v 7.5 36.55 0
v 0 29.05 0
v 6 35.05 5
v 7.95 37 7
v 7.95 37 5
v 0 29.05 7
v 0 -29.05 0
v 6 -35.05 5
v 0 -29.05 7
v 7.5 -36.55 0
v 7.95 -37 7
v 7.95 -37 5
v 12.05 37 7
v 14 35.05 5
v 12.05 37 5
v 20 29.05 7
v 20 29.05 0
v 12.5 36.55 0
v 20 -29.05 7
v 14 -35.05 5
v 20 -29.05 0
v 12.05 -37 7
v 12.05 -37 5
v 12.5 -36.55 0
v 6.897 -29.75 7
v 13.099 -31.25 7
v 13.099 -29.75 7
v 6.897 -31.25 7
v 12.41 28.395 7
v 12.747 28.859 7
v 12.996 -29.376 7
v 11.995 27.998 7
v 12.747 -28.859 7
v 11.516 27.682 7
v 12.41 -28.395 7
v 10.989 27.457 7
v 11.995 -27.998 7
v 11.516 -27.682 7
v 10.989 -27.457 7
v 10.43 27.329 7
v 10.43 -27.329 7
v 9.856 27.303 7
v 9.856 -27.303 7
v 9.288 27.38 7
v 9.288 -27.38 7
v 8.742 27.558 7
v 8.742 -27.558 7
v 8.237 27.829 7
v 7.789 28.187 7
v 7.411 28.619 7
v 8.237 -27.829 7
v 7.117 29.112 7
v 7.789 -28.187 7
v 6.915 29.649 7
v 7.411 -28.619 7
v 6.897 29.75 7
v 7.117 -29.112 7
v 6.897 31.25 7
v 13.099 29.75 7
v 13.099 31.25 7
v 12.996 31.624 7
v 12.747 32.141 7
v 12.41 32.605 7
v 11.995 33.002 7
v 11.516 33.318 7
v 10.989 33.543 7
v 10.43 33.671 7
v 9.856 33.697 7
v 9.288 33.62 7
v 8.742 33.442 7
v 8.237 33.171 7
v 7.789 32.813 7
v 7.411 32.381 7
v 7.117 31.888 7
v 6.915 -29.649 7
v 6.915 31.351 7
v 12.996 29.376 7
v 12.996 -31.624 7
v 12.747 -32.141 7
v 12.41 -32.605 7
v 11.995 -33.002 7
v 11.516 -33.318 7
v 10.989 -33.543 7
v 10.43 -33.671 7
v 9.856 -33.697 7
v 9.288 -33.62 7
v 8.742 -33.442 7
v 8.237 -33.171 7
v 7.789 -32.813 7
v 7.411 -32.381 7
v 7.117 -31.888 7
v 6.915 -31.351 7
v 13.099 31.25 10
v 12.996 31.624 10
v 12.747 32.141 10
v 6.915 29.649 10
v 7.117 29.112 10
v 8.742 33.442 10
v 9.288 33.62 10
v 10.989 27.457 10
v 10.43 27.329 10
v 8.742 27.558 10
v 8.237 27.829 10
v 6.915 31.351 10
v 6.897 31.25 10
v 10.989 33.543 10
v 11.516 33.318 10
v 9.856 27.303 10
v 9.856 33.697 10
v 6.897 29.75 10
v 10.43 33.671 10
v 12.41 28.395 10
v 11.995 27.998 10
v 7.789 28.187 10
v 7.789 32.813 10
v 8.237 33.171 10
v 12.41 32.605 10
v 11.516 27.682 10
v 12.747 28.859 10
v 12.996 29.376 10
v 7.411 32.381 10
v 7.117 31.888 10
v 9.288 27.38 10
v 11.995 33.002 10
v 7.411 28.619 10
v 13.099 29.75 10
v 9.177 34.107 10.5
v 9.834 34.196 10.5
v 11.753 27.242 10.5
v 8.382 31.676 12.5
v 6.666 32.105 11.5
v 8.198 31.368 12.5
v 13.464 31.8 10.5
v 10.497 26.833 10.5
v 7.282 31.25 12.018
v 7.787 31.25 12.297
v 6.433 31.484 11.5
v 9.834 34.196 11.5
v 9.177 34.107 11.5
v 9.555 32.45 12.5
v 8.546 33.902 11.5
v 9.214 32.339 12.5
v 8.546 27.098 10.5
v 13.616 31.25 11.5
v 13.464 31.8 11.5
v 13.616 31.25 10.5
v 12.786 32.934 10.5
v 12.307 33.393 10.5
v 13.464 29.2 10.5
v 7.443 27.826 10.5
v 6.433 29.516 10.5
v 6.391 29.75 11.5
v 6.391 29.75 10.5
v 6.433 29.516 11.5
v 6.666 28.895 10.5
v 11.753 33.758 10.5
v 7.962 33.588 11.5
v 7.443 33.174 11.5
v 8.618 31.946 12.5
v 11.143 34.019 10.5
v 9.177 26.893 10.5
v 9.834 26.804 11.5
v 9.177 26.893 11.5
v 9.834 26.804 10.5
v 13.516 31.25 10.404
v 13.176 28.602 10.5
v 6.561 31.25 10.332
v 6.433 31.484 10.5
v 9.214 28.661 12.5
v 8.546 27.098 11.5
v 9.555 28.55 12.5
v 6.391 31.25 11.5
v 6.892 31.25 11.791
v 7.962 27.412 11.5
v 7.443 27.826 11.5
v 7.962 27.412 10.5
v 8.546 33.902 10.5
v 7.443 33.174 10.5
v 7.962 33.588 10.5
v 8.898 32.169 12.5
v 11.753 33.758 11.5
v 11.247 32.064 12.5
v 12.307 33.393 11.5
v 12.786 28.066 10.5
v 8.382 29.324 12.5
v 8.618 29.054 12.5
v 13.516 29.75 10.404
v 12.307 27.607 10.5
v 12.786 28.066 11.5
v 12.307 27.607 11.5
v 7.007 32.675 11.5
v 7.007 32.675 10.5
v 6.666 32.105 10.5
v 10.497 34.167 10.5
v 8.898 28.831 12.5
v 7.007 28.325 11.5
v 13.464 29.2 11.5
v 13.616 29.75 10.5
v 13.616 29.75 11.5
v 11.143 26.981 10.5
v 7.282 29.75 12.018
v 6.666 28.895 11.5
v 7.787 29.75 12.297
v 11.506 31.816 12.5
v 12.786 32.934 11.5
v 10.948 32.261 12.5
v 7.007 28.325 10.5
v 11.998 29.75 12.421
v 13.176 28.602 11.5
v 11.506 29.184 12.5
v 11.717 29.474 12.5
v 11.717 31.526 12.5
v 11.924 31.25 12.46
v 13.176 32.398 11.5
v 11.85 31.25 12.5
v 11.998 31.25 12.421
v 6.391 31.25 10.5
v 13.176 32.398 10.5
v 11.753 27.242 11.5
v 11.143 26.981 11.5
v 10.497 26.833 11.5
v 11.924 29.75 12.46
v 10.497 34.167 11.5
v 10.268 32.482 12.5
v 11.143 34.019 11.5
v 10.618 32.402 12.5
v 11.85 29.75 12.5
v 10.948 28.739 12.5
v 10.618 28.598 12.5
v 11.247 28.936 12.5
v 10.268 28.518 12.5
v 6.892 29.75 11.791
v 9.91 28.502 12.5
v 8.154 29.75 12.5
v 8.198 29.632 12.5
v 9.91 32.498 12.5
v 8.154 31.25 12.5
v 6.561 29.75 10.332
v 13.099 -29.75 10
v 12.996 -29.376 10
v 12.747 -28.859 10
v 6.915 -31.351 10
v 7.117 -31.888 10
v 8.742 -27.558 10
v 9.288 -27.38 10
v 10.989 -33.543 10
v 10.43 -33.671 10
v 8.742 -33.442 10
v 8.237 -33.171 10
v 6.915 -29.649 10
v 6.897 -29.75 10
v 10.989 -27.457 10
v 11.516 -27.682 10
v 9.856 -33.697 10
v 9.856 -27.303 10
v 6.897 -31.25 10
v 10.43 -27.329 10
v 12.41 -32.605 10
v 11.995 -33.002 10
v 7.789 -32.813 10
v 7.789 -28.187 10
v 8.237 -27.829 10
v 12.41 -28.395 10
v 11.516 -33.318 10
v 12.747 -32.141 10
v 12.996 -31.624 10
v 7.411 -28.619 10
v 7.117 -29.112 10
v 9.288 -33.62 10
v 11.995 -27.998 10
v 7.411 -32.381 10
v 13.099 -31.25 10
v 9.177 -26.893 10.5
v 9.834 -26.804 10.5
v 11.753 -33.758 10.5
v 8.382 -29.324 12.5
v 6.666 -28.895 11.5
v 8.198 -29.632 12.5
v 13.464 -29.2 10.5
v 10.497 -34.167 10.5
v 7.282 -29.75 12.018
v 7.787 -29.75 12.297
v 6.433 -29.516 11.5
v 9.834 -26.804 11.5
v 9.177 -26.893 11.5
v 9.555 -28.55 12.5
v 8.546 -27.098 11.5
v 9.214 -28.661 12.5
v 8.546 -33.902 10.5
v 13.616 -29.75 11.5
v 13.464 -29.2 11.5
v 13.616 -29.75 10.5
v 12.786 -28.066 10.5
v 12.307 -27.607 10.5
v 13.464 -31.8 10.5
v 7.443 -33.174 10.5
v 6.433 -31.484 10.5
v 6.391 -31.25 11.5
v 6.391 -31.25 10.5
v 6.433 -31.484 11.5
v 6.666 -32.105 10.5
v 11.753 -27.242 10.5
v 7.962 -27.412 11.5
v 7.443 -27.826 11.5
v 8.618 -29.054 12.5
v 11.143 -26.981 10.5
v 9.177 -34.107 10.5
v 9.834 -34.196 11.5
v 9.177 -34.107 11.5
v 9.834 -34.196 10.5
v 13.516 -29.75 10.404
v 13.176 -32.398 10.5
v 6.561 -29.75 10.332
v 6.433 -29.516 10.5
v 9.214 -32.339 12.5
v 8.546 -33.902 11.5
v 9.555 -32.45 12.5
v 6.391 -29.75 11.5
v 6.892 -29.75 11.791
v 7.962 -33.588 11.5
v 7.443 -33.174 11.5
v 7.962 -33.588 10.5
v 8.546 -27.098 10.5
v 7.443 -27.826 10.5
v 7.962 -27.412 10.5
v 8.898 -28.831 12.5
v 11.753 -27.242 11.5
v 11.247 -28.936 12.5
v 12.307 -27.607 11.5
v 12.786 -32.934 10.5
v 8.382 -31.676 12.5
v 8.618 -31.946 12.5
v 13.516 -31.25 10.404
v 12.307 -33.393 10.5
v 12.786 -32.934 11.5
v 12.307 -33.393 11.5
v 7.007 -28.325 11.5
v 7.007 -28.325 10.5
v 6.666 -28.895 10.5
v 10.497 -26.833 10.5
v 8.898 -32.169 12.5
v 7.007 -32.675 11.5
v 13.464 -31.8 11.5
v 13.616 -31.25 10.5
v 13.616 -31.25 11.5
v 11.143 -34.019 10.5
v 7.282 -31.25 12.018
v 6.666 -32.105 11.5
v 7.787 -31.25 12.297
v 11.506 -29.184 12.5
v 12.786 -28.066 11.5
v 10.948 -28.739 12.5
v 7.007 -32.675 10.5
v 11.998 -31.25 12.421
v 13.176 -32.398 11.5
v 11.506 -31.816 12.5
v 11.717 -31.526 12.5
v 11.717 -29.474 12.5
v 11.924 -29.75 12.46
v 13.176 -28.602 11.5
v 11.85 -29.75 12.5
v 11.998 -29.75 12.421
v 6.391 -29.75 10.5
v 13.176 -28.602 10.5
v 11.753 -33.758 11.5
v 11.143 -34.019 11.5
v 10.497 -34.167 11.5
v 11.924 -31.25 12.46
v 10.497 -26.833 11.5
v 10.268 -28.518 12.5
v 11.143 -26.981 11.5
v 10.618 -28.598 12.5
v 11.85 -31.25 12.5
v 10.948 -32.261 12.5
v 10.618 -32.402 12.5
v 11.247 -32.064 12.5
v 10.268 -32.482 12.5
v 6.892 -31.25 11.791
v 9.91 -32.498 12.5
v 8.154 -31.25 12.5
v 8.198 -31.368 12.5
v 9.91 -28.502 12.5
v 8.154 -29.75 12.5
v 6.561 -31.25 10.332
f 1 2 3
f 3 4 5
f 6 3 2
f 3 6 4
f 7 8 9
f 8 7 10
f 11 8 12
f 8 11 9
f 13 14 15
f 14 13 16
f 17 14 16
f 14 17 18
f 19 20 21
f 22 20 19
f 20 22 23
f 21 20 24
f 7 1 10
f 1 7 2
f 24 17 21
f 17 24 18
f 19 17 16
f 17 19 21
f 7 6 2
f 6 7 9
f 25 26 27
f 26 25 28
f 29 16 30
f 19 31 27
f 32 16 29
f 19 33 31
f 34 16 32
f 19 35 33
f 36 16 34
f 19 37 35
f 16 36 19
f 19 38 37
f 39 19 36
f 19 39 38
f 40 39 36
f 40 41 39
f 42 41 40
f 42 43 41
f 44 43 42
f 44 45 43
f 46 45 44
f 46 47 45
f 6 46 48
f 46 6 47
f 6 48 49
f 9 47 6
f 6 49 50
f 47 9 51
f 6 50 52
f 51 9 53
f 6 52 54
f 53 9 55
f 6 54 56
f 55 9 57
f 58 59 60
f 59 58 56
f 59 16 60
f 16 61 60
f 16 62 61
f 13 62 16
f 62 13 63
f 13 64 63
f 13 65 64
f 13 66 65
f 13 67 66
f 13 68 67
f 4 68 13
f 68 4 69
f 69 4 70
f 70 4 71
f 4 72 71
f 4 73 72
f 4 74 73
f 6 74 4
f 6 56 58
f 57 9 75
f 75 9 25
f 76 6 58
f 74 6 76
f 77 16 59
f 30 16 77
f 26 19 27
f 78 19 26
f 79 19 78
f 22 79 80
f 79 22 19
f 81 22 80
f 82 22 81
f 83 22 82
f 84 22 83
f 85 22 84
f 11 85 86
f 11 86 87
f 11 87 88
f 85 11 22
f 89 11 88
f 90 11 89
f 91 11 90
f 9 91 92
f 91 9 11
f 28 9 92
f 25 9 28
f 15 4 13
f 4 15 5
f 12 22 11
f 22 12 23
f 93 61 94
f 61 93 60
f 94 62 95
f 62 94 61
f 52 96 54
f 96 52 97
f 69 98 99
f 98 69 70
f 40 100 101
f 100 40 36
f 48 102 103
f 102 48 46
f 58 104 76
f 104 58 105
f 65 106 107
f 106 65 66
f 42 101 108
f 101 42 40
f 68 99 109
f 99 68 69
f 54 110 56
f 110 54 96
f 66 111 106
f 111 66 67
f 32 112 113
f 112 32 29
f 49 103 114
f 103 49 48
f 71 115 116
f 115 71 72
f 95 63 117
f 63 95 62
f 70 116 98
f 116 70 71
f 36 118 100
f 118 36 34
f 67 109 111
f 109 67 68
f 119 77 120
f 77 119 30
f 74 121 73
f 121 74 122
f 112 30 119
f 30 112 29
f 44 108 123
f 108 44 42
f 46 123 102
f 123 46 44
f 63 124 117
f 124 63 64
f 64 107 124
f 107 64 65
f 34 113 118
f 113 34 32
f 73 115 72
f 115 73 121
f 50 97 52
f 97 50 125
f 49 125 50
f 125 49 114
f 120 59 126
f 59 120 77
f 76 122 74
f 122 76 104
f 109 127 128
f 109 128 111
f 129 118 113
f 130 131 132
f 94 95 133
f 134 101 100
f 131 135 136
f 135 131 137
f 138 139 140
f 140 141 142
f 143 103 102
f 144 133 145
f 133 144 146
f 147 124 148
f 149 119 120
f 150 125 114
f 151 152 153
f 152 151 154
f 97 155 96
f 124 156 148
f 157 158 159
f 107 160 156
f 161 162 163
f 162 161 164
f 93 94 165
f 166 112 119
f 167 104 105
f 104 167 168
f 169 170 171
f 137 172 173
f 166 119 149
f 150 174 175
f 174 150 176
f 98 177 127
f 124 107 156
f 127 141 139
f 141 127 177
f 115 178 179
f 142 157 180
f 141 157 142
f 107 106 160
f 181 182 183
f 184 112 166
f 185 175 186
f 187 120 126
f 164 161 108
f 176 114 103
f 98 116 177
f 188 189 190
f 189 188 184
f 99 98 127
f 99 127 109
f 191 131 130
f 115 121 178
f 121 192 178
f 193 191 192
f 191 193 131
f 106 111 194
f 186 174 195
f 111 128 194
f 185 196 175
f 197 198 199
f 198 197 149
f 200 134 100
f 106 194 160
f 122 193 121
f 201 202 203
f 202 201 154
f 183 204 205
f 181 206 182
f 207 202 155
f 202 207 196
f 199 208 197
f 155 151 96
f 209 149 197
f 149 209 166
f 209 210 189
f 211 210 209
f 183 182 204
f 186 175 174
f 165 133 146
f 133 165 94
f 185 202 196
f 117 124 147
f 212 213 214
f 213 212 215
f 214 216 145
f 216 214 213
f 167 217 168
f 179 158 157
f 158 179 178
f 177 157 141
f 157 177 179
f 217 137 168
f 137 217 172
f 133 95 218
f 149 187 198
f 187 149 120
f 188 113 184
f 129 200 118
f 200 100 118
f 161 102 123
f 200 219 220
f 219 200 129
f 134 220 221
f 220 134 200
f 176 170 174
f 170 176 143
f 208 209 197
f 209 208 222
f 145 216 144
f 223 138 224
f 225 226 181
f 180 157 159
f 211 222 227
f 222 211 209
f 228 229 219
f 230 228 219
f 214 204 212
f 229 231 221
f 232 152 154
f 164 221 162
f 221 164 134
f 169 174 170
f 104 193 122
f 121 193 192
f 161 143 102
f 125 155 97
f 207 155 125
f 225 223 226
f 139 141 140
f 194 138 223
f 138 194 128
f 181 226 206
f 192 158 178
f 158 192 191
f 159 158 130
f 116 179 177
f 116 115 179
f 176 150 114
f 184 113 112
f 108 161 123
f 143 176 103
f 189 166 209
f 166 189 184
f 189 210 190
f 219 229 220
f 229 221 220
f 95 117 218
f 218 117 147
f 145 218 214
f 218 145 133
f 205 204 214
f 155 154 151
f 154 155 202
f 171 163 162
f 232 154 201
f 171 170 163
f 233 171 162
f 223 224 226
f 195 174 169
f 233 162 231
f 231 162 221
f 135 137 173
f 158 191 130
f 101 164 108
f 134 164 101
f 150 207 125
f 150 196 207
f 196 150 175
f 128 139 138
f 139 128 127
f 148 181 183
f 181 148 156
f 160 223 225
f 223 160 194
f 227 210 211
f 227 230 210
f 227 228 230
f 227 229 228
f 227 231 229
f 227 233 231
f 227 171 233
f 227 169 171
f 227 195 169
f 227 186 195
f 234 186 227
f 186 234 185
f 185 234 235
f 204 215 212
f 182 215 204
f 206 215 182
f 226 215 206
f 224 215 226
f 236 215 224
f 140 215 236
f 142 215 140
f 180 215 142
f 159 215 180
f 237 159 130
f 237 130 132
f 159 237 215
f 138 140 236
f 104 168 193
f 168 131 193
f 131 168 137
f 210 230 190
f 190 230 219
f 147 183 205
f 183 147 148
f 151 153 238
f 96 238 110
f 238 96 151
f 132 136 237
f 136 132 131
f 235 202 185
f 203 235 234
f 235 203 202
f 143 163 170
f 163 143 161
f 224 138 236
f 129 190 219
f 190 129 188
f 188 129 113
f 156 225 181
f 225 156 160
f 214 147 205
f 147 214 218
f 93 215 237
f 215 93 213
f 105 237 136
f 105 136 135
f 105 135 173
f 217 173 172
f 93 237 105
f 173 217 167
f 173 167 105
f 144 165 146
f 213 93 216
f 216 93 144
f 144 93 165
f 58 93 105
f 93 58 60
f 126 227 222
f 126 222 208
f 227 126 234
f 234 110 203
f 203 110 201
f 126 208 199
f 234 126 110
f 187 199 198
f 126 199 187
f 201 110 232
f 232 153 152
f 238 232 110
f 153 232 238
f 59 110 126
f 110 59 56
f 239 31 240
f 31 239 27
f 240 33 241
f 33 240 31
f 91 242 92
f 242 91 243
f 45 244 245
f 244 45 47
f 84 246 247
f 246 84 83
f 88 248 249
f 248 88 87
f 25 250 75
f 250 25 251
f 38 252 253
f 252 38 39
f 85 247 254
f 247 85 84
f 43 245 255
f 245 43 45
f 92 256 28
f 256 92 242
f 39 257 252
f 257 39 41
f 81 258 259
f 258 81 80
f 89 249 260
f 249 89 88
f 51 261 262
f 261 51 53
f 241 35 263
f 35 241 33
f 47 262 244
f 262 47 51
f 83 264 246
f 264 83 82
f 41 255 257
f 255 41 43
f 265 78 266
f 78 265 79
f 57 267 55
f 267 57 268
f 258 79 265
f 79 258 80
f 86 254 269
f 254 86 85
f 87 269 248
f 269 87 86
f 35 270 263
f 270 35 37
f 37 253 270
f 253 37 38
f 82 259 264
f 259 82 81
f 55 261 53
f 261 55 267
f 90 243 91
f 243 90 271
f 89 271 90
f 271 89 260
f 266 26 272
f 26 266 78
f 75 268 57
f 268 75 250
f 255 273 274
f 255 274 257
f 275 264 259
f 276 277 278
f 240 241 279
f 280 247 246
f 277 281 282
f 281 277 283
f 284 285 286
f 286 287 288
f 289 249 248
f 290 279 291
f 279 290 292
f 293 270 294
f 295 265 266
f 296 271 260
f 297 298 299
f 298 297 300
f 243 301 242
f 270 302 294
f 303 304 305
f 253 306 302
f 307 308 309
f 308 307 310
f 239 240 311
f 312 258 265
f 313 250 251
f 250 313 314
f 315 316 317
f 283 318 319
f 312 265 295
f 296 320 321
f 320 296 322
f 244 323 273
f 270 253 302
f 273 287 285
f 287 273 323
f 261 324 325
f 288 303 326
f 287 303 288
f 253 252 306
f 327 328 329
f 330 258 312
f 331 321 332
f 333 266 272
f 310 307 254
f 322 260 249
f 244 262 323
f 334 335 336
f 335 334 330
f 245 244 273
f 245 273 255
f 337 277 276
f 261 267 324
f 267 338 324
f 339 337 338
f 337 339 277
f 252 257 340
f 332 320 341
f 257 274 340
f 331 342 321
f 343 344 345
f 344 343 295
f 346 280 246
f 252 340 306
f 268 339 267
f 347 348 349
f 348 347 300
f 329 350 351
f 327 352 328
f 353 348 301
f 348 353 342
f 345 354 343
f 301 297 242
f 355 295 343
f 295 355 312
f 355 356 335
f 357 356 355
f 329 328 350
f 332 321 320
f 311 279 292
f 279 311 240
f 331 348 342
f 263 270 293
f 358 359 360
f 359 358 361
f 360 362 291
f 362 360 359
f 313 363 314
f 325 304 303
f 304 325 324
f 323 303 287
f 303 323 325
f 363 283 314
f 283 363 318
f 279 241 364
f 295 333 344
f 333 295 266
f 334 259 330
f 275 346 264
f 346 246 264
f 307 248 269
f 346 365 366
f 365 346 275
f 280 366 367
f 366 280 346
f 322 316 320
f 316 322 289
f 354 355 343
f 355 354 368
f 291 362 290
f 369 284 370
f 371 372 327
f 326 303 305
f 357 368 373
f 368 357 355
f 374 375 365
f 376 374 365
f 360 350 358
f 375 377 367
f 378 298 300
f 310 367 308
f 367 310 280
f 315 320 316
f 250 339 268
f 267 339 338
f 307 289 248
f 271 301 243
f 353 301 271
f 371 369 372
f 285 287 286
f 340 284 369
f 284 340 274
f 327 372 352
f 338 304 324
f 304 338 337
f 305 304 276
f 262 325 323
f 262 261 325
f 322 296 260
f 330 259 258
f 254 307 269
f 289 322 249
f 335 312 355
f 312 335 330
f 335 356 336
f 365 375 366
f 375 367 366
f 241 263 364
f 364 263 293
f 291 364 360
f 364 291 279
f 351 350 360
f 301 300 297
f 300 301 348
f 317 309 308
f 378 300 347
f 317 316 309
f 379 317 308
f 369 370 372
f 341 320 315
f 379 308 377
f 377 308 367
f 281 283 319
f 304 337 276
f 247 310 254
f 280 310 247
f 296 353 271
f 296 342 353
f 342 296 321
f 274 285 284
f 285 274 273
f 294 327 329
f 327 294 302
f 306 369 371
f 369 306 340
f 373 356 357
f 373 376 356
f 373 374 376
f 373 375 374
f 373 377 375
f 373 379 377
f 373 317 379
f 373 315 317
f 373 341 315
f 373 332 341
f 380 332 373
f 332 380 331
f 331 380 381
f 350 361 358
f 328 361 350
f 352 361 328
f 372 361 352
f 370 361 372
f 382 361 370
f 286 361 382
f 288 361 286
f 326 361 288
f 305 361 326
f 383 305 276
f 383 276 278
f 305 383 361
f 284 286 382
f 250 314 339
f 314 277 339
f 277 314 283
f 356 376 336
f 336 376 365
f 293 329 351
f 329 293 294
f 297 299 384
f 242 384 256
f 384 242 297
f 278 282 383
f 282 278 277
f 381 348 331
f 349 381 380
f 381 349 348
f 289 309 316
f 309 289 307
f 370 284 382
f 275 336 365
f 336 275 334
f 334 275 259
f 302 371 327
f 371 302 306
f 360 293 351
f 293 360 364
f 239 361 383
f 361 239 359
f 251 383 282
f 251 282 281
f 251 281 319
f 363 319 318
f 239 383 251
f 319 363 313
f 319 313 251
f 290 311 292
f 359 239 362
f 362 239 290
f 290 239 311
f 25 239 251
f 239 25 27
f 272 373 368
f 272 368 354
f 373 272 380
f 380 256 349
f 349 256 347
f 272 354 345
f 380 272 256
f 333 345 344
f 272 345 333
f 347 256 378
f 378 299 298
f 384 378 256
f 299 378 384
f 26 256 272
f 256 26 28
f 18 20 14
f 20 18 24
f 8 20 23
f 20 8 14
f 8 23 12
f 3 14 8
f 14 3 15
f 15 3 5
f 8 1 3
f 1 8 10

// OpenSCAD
// file: globals.scad
/*
Most things in this file is represented as one millimeter, so keep that in mind while changing things.
Some of the setting are not mm but at variables that you can set, such as 2*x=2x and you are setting what x is.
I will try to specify when things are variables and not exact measurements.
*/

obj_leg = 30;
leg_length = 5.5;
small_number = 0.001;
metal_core_rode_global = 5;


///////////////// number of holes /////////////////////
z_hole_number = 8;
other_holes = 8;

///////////////// Pins /////////////////////

//pins that poke out
ball_size = 10;
pin_height = 20;
pin_diameter = 6;


//holes
hole_ball_size = ball_size;
hole_pin_height = pin_height;
hole_pin_diameter = pin_diameter;

///////////////// Z THINGS /////////////////////

berring_slot_width = 7.5;
berring_slot_depth = 6.5;
metal_core_rode = 5;

///////////////// X THINGS /////////////////////

//male dove tails
max_width=8;
min_width=5;
depth=5;
height=obj_leg/2;

//female dove tails, this is found on the y mounts
girl_max_width=11;
girl_min_width=5;
girl_depth=5;
girl_height=obj_leg;


///////////////// Y THINGS /////////////////////
/*
The Y is so normal that all of those global variables at the top should change all of the setting in it, this section is set her incase there are variables set in the future development of this project.
*/
// file: include.scad
//////////////////      END SECTION       //////////////////

	module added_pins(){
		difference(){
			union(){
				translate([30/(15/4),obj_leg*leg_length,30/(15/4)]) pin();
				translate([30/(15/4)+14.5,obj_leg*leg_length,30/(15/4)+14]) pin();
			}
			union(){
							translate([30/(15/4)+13.5,obj_leg*leg_length-20,30/(15/4)+5])cube(size=[2,40,15]);
							translate([30/(15/4)+7.5,obj_leg*leg_length-20,30/(15/4)+15])rotate([0,90,0]) cube(size=[2,40,15]);	

							translate([30/(15/4)-1,obj_leg*leg_length-20,30/(15/4)-8])cube(size=[2,40,15]);
							translate([30/(15/4)-10,obj_leg*leg_length-20,30/(15/4)+1])rotate([0,90,0]) cube(size=[2,40,15]);
			}
		}
	}
	module taken_pins() {
		translate([30/(15/4)+14,obj_leg*leg_length-10,30/(15/4)]) mirror_pin();
		translate([30/(15/4),obj_leg*leg_length-10,30/(15/4)+15]) mirror_pin();
	}


//////////////////      OTHER STUFF       //////////////////

	module holes() {
		rotate([0,0,90]) for(y=[0:other_holes])
		translate([obj_leg+y*15,-15.5,7.5]) union() {
			translate([7.5,0,15]) hole_up();
			hole_down();
		}
	}
	module extend_holes() {
	module top(){
		rotate([0,0,90]) for(y=[0:other_holes+1])
		translate([(30/4)+y*15,-15.5,7.5]) union() {
			translate([7.5,0,15]) hole_up();
		}
	}
	module bottom(){
		rotate([0,0,90]) for(y=[0:other_holes+2])
		translate([(30/4)+y*15,-15.5,7.5]) union() {
			hole_down();
		
}
	}
	union(){
		top();
		bottom();
	}
	}

	module hole() {
		union() {
			rotate([90, 90, 0]) cylinder(h=40, d=hole_pin_diameter, center=true);
			translate([0,7.5,0]) sphere(d=hole_ball_size);
			translate([0,-6,0]) sphere(d=hole_ball_size);
		}
	}
	module hole_up() {
		union() {
			rotate([90, 90, 0]) cylinder(h=40, d=hole_pin_diameter, center=true);
			translate([0,7.5,10]) cylinder(h=hole_pin_height, d=hole_pin_diameter, center=true);
			translate([0,-6,10]) cylinder(h=hole_pin_height, d=hole_pin_diameter, center=true);
			translate([0,7.5,0]) sphere(d=hole_ball_size);
			translate([0,-6,0]) sphere(d=hole_ball_size);
		}
	}
	module hole_down() {
		union() {
			rotate([90, 90, 0]) cylinder(h=40, d=hole_pin_diameter, center=true);
			translate([0,7.5,-10]) cylinder(h=hole_pin_height, d=hole_pin_diameter, center=true);
			translate([0,-6,-10]) cylinder(h=hole_pin_height, d=hole_pin_diameter, center=true);
			translate([0,7.5,0]) sphere(d=hole_ball_size);
			translate([0,-6,0]) sphere(d=hole_ball_size);
		}
	}
	module pin() {
		union() {
			rotate([90, 90, 0]) cylinder(h=pin_height, d=pin_diameter, center=true);
			translate([0,7.5,0]) sphere(d=ball_size);
		}
	}

	module mirror_pin() {
		rotate([90, 90, 0]) cylinder(h=hole_pin_height+small_number, d=hole_pin_diameter, center=true);
		translate([0,-(pin_height-(ball_size/2)),0]) sphere(d=ball_size);
	}


//////////////////      SOME RACK AND Z THINGS       //////////////////

module z_holes() {
    rotate([0,-90,0]) for(z=[0:z_hole_number])
    translate([22.5+z*15,16,-12])
        hole();
}

module pin_cuts() {
	union(){
		cube(size=[2,10,40], center=true);
		rotate([0,0,90]) cube(size=[2,10,40], center=true);
	}
}
module pin_uncut() {
	union(){
		rotate([0, 0, 90]) cylinder(h=hole_pin_height, d=hole_pin_diameter, center=true);
		translate([0,0,10]) sphere(d=ball_hole);
	}
}


module pin_out() {
	union(){
		rotate([0, 0, 90]) cylinder(h=pin_height, d=pin_diameter, center=true);
		translate([0,0,10]) sphere(d= ball_size);
	}
}


module pins_z(){
	difference() {
		pin_out();
		pin_cuts();
	}
}
//////////////////      RACK AND SLIDE     ///////////////////

module straight_pins() {
	for(z=[0:((((obj_leg*leg_length)*2)-(obj_leg*2))/3)/14.5]) rotate([-90,0,0]) translate([z*15,30/(15/4),14]) pins_z();
	for(z=[0:((((obj_leg*leg_length)*2)-(obj_leg*2))/3)/14.5]) rotate([-90,0,0]) translate([z*15,30/(15/4)-14,14]) pins_z();
}
module stagger_pins() {
	for(z=[0:((((obj_leg*leg_length)*2)-(obj_leg*2))/3)/14.5]) rotate([-90,0,0]) translate([z*15,30/(15/4),14]) pins_z();
	for(z=[0:((((obj_leg*leg_length)*2)-(obj_leg*2))/3)/14.5]) rotate([-90,0,0]) translate([z*15+7,30/(15/4)-14,14]) pins_z();
}


//////////////////      DOVE TAIL       //////////////////

module male_dovetail(height) {
	dovetail_3d(max_width,min_width,depth,height);
}

module dovetail_3d(max_width=11, min_width=5, depth=5, height=30) {
	linear_extrude(height=height, convexity=2)
		dovetail_2d(max_width,min_width,depth);
}

module dovetail_2d(max_width=11, min_width=5, depth=5) {
	angle=atan((max_width/2-min_width/2)/depth);
	echo("angle: ", angle);
	polygon(paths=[[0,1,2,3,0]], points=[[-min_width/2,0], [-max_width/2,depth], [max_width/2, depth], [min_width/2,0]]);
}

//bow tie
	module tie_end(height){
				rotate([0,0,0]) translate([0,-0.01,((obj_leg/2)/2)]) male_dovetail(height);
				rotate([0,90,0]) translate([0,-0.01,((obj_leg/2)/2)]) male_dovetail(height);
				rotate([0,180,0]) translate([0,-0.01,((obj_leg/2)/2)]) male_dovetail(height);
				rotate([0,-90,0]) translate([0,-0.01,((obj_leg/2)/2)]) male_dovetail(height);
	}

module bow_support(){
	difference(){
		intersection(){
			translate([-15,0,-15]) cube([30,9,30]);
			scale([1.05,1.05,1.05]) rotate([0,45,0]) tie_end();
		}
		cube([29.2,29.2,29.2], center=true);
	}
}

	module wrap(units){
	for (y = [-1:units-2]) // two iterations, z = -1, z = 1
	{
			translate([15, (y*30)+15, 15]){
			for (r = [0:4]) // two iterations, z = -1, z = 1
			{
				rotate([0,r*90,0]) translate([0,15,15]) rotate([-90,0,0])male_dovetail(height=30);
			}
		}
	}
	}
// file: long_bow_tie.scad
length = 50;
tilt_level = 1.1;
scaling_x = .95;
scaling_y = 1;
scaling_z = 1;
include <include.scad>;
include <globals.scad>;

obj_leg= 12;
module bow_tie_master(){
	union(){
		mirror([0,1,0]){
			male_dovetail(height=length);
		}
			male_dovetail(height=length);		
	}
}

intersection(){
    scale([scaling_x,scaling_y,scaling_z])	rotate([90,0,0]) bow_tie_master();
    rotate([90,0,0]) cylinder(r=5.7, h=200);
}
// main file
use <long_bow_tie.scad>;
include <include.scad>;
include <globals.scad>;

$fn=35;

module fixing_pin() {
    difference() {
        union() {
            cylinder(3, r=3.2);
            hull() {
                translate([0,0,3]) cylinder(0.5, r=3.2);
                translate([0,0,3.5]) cylinder(1, r=3.7);
                translate([0,0,4.5]) cylinder(1, r=2);
            }
        }
        cube([8,1.5,12], center=true);
    }
}

module fixing_plate() {
    difference() {
        translate([-14.5,0,10]) cube([7,74,20], center = true);
		union() {
			// fixing plate cutout
			translate([-16,34,0]) rotate([45,0,0]) cube([16,16,7], center = true);
			translate([-16,-34,0]) rotate([135,0,0]) cube([16,16,7], center = true);
			translate([-16,34,20]) rotate([135,0,0]) cube([16,16,7], center = true);
			translate([-16,-34,20]) rotate([45,0,0]) cube([16,16,7], center = true);
		}
	}
	translate([-18,30.5,10]) rotate([0,270,0]) fixing_pin();
	translate([-18,-30.5,10]) rotate([0,270,0]) fixing_pin();

}

module do_airtrippers_bowden_mount() {
    difference() {
        translate([0,0,-11]) rotate([0,90,0]) fixing_plate();
        translate([10,40,0]) rotate([90,0,0]) male_dovetail(height=80);
    }
}

do_airtrippers_bowden_mount();
